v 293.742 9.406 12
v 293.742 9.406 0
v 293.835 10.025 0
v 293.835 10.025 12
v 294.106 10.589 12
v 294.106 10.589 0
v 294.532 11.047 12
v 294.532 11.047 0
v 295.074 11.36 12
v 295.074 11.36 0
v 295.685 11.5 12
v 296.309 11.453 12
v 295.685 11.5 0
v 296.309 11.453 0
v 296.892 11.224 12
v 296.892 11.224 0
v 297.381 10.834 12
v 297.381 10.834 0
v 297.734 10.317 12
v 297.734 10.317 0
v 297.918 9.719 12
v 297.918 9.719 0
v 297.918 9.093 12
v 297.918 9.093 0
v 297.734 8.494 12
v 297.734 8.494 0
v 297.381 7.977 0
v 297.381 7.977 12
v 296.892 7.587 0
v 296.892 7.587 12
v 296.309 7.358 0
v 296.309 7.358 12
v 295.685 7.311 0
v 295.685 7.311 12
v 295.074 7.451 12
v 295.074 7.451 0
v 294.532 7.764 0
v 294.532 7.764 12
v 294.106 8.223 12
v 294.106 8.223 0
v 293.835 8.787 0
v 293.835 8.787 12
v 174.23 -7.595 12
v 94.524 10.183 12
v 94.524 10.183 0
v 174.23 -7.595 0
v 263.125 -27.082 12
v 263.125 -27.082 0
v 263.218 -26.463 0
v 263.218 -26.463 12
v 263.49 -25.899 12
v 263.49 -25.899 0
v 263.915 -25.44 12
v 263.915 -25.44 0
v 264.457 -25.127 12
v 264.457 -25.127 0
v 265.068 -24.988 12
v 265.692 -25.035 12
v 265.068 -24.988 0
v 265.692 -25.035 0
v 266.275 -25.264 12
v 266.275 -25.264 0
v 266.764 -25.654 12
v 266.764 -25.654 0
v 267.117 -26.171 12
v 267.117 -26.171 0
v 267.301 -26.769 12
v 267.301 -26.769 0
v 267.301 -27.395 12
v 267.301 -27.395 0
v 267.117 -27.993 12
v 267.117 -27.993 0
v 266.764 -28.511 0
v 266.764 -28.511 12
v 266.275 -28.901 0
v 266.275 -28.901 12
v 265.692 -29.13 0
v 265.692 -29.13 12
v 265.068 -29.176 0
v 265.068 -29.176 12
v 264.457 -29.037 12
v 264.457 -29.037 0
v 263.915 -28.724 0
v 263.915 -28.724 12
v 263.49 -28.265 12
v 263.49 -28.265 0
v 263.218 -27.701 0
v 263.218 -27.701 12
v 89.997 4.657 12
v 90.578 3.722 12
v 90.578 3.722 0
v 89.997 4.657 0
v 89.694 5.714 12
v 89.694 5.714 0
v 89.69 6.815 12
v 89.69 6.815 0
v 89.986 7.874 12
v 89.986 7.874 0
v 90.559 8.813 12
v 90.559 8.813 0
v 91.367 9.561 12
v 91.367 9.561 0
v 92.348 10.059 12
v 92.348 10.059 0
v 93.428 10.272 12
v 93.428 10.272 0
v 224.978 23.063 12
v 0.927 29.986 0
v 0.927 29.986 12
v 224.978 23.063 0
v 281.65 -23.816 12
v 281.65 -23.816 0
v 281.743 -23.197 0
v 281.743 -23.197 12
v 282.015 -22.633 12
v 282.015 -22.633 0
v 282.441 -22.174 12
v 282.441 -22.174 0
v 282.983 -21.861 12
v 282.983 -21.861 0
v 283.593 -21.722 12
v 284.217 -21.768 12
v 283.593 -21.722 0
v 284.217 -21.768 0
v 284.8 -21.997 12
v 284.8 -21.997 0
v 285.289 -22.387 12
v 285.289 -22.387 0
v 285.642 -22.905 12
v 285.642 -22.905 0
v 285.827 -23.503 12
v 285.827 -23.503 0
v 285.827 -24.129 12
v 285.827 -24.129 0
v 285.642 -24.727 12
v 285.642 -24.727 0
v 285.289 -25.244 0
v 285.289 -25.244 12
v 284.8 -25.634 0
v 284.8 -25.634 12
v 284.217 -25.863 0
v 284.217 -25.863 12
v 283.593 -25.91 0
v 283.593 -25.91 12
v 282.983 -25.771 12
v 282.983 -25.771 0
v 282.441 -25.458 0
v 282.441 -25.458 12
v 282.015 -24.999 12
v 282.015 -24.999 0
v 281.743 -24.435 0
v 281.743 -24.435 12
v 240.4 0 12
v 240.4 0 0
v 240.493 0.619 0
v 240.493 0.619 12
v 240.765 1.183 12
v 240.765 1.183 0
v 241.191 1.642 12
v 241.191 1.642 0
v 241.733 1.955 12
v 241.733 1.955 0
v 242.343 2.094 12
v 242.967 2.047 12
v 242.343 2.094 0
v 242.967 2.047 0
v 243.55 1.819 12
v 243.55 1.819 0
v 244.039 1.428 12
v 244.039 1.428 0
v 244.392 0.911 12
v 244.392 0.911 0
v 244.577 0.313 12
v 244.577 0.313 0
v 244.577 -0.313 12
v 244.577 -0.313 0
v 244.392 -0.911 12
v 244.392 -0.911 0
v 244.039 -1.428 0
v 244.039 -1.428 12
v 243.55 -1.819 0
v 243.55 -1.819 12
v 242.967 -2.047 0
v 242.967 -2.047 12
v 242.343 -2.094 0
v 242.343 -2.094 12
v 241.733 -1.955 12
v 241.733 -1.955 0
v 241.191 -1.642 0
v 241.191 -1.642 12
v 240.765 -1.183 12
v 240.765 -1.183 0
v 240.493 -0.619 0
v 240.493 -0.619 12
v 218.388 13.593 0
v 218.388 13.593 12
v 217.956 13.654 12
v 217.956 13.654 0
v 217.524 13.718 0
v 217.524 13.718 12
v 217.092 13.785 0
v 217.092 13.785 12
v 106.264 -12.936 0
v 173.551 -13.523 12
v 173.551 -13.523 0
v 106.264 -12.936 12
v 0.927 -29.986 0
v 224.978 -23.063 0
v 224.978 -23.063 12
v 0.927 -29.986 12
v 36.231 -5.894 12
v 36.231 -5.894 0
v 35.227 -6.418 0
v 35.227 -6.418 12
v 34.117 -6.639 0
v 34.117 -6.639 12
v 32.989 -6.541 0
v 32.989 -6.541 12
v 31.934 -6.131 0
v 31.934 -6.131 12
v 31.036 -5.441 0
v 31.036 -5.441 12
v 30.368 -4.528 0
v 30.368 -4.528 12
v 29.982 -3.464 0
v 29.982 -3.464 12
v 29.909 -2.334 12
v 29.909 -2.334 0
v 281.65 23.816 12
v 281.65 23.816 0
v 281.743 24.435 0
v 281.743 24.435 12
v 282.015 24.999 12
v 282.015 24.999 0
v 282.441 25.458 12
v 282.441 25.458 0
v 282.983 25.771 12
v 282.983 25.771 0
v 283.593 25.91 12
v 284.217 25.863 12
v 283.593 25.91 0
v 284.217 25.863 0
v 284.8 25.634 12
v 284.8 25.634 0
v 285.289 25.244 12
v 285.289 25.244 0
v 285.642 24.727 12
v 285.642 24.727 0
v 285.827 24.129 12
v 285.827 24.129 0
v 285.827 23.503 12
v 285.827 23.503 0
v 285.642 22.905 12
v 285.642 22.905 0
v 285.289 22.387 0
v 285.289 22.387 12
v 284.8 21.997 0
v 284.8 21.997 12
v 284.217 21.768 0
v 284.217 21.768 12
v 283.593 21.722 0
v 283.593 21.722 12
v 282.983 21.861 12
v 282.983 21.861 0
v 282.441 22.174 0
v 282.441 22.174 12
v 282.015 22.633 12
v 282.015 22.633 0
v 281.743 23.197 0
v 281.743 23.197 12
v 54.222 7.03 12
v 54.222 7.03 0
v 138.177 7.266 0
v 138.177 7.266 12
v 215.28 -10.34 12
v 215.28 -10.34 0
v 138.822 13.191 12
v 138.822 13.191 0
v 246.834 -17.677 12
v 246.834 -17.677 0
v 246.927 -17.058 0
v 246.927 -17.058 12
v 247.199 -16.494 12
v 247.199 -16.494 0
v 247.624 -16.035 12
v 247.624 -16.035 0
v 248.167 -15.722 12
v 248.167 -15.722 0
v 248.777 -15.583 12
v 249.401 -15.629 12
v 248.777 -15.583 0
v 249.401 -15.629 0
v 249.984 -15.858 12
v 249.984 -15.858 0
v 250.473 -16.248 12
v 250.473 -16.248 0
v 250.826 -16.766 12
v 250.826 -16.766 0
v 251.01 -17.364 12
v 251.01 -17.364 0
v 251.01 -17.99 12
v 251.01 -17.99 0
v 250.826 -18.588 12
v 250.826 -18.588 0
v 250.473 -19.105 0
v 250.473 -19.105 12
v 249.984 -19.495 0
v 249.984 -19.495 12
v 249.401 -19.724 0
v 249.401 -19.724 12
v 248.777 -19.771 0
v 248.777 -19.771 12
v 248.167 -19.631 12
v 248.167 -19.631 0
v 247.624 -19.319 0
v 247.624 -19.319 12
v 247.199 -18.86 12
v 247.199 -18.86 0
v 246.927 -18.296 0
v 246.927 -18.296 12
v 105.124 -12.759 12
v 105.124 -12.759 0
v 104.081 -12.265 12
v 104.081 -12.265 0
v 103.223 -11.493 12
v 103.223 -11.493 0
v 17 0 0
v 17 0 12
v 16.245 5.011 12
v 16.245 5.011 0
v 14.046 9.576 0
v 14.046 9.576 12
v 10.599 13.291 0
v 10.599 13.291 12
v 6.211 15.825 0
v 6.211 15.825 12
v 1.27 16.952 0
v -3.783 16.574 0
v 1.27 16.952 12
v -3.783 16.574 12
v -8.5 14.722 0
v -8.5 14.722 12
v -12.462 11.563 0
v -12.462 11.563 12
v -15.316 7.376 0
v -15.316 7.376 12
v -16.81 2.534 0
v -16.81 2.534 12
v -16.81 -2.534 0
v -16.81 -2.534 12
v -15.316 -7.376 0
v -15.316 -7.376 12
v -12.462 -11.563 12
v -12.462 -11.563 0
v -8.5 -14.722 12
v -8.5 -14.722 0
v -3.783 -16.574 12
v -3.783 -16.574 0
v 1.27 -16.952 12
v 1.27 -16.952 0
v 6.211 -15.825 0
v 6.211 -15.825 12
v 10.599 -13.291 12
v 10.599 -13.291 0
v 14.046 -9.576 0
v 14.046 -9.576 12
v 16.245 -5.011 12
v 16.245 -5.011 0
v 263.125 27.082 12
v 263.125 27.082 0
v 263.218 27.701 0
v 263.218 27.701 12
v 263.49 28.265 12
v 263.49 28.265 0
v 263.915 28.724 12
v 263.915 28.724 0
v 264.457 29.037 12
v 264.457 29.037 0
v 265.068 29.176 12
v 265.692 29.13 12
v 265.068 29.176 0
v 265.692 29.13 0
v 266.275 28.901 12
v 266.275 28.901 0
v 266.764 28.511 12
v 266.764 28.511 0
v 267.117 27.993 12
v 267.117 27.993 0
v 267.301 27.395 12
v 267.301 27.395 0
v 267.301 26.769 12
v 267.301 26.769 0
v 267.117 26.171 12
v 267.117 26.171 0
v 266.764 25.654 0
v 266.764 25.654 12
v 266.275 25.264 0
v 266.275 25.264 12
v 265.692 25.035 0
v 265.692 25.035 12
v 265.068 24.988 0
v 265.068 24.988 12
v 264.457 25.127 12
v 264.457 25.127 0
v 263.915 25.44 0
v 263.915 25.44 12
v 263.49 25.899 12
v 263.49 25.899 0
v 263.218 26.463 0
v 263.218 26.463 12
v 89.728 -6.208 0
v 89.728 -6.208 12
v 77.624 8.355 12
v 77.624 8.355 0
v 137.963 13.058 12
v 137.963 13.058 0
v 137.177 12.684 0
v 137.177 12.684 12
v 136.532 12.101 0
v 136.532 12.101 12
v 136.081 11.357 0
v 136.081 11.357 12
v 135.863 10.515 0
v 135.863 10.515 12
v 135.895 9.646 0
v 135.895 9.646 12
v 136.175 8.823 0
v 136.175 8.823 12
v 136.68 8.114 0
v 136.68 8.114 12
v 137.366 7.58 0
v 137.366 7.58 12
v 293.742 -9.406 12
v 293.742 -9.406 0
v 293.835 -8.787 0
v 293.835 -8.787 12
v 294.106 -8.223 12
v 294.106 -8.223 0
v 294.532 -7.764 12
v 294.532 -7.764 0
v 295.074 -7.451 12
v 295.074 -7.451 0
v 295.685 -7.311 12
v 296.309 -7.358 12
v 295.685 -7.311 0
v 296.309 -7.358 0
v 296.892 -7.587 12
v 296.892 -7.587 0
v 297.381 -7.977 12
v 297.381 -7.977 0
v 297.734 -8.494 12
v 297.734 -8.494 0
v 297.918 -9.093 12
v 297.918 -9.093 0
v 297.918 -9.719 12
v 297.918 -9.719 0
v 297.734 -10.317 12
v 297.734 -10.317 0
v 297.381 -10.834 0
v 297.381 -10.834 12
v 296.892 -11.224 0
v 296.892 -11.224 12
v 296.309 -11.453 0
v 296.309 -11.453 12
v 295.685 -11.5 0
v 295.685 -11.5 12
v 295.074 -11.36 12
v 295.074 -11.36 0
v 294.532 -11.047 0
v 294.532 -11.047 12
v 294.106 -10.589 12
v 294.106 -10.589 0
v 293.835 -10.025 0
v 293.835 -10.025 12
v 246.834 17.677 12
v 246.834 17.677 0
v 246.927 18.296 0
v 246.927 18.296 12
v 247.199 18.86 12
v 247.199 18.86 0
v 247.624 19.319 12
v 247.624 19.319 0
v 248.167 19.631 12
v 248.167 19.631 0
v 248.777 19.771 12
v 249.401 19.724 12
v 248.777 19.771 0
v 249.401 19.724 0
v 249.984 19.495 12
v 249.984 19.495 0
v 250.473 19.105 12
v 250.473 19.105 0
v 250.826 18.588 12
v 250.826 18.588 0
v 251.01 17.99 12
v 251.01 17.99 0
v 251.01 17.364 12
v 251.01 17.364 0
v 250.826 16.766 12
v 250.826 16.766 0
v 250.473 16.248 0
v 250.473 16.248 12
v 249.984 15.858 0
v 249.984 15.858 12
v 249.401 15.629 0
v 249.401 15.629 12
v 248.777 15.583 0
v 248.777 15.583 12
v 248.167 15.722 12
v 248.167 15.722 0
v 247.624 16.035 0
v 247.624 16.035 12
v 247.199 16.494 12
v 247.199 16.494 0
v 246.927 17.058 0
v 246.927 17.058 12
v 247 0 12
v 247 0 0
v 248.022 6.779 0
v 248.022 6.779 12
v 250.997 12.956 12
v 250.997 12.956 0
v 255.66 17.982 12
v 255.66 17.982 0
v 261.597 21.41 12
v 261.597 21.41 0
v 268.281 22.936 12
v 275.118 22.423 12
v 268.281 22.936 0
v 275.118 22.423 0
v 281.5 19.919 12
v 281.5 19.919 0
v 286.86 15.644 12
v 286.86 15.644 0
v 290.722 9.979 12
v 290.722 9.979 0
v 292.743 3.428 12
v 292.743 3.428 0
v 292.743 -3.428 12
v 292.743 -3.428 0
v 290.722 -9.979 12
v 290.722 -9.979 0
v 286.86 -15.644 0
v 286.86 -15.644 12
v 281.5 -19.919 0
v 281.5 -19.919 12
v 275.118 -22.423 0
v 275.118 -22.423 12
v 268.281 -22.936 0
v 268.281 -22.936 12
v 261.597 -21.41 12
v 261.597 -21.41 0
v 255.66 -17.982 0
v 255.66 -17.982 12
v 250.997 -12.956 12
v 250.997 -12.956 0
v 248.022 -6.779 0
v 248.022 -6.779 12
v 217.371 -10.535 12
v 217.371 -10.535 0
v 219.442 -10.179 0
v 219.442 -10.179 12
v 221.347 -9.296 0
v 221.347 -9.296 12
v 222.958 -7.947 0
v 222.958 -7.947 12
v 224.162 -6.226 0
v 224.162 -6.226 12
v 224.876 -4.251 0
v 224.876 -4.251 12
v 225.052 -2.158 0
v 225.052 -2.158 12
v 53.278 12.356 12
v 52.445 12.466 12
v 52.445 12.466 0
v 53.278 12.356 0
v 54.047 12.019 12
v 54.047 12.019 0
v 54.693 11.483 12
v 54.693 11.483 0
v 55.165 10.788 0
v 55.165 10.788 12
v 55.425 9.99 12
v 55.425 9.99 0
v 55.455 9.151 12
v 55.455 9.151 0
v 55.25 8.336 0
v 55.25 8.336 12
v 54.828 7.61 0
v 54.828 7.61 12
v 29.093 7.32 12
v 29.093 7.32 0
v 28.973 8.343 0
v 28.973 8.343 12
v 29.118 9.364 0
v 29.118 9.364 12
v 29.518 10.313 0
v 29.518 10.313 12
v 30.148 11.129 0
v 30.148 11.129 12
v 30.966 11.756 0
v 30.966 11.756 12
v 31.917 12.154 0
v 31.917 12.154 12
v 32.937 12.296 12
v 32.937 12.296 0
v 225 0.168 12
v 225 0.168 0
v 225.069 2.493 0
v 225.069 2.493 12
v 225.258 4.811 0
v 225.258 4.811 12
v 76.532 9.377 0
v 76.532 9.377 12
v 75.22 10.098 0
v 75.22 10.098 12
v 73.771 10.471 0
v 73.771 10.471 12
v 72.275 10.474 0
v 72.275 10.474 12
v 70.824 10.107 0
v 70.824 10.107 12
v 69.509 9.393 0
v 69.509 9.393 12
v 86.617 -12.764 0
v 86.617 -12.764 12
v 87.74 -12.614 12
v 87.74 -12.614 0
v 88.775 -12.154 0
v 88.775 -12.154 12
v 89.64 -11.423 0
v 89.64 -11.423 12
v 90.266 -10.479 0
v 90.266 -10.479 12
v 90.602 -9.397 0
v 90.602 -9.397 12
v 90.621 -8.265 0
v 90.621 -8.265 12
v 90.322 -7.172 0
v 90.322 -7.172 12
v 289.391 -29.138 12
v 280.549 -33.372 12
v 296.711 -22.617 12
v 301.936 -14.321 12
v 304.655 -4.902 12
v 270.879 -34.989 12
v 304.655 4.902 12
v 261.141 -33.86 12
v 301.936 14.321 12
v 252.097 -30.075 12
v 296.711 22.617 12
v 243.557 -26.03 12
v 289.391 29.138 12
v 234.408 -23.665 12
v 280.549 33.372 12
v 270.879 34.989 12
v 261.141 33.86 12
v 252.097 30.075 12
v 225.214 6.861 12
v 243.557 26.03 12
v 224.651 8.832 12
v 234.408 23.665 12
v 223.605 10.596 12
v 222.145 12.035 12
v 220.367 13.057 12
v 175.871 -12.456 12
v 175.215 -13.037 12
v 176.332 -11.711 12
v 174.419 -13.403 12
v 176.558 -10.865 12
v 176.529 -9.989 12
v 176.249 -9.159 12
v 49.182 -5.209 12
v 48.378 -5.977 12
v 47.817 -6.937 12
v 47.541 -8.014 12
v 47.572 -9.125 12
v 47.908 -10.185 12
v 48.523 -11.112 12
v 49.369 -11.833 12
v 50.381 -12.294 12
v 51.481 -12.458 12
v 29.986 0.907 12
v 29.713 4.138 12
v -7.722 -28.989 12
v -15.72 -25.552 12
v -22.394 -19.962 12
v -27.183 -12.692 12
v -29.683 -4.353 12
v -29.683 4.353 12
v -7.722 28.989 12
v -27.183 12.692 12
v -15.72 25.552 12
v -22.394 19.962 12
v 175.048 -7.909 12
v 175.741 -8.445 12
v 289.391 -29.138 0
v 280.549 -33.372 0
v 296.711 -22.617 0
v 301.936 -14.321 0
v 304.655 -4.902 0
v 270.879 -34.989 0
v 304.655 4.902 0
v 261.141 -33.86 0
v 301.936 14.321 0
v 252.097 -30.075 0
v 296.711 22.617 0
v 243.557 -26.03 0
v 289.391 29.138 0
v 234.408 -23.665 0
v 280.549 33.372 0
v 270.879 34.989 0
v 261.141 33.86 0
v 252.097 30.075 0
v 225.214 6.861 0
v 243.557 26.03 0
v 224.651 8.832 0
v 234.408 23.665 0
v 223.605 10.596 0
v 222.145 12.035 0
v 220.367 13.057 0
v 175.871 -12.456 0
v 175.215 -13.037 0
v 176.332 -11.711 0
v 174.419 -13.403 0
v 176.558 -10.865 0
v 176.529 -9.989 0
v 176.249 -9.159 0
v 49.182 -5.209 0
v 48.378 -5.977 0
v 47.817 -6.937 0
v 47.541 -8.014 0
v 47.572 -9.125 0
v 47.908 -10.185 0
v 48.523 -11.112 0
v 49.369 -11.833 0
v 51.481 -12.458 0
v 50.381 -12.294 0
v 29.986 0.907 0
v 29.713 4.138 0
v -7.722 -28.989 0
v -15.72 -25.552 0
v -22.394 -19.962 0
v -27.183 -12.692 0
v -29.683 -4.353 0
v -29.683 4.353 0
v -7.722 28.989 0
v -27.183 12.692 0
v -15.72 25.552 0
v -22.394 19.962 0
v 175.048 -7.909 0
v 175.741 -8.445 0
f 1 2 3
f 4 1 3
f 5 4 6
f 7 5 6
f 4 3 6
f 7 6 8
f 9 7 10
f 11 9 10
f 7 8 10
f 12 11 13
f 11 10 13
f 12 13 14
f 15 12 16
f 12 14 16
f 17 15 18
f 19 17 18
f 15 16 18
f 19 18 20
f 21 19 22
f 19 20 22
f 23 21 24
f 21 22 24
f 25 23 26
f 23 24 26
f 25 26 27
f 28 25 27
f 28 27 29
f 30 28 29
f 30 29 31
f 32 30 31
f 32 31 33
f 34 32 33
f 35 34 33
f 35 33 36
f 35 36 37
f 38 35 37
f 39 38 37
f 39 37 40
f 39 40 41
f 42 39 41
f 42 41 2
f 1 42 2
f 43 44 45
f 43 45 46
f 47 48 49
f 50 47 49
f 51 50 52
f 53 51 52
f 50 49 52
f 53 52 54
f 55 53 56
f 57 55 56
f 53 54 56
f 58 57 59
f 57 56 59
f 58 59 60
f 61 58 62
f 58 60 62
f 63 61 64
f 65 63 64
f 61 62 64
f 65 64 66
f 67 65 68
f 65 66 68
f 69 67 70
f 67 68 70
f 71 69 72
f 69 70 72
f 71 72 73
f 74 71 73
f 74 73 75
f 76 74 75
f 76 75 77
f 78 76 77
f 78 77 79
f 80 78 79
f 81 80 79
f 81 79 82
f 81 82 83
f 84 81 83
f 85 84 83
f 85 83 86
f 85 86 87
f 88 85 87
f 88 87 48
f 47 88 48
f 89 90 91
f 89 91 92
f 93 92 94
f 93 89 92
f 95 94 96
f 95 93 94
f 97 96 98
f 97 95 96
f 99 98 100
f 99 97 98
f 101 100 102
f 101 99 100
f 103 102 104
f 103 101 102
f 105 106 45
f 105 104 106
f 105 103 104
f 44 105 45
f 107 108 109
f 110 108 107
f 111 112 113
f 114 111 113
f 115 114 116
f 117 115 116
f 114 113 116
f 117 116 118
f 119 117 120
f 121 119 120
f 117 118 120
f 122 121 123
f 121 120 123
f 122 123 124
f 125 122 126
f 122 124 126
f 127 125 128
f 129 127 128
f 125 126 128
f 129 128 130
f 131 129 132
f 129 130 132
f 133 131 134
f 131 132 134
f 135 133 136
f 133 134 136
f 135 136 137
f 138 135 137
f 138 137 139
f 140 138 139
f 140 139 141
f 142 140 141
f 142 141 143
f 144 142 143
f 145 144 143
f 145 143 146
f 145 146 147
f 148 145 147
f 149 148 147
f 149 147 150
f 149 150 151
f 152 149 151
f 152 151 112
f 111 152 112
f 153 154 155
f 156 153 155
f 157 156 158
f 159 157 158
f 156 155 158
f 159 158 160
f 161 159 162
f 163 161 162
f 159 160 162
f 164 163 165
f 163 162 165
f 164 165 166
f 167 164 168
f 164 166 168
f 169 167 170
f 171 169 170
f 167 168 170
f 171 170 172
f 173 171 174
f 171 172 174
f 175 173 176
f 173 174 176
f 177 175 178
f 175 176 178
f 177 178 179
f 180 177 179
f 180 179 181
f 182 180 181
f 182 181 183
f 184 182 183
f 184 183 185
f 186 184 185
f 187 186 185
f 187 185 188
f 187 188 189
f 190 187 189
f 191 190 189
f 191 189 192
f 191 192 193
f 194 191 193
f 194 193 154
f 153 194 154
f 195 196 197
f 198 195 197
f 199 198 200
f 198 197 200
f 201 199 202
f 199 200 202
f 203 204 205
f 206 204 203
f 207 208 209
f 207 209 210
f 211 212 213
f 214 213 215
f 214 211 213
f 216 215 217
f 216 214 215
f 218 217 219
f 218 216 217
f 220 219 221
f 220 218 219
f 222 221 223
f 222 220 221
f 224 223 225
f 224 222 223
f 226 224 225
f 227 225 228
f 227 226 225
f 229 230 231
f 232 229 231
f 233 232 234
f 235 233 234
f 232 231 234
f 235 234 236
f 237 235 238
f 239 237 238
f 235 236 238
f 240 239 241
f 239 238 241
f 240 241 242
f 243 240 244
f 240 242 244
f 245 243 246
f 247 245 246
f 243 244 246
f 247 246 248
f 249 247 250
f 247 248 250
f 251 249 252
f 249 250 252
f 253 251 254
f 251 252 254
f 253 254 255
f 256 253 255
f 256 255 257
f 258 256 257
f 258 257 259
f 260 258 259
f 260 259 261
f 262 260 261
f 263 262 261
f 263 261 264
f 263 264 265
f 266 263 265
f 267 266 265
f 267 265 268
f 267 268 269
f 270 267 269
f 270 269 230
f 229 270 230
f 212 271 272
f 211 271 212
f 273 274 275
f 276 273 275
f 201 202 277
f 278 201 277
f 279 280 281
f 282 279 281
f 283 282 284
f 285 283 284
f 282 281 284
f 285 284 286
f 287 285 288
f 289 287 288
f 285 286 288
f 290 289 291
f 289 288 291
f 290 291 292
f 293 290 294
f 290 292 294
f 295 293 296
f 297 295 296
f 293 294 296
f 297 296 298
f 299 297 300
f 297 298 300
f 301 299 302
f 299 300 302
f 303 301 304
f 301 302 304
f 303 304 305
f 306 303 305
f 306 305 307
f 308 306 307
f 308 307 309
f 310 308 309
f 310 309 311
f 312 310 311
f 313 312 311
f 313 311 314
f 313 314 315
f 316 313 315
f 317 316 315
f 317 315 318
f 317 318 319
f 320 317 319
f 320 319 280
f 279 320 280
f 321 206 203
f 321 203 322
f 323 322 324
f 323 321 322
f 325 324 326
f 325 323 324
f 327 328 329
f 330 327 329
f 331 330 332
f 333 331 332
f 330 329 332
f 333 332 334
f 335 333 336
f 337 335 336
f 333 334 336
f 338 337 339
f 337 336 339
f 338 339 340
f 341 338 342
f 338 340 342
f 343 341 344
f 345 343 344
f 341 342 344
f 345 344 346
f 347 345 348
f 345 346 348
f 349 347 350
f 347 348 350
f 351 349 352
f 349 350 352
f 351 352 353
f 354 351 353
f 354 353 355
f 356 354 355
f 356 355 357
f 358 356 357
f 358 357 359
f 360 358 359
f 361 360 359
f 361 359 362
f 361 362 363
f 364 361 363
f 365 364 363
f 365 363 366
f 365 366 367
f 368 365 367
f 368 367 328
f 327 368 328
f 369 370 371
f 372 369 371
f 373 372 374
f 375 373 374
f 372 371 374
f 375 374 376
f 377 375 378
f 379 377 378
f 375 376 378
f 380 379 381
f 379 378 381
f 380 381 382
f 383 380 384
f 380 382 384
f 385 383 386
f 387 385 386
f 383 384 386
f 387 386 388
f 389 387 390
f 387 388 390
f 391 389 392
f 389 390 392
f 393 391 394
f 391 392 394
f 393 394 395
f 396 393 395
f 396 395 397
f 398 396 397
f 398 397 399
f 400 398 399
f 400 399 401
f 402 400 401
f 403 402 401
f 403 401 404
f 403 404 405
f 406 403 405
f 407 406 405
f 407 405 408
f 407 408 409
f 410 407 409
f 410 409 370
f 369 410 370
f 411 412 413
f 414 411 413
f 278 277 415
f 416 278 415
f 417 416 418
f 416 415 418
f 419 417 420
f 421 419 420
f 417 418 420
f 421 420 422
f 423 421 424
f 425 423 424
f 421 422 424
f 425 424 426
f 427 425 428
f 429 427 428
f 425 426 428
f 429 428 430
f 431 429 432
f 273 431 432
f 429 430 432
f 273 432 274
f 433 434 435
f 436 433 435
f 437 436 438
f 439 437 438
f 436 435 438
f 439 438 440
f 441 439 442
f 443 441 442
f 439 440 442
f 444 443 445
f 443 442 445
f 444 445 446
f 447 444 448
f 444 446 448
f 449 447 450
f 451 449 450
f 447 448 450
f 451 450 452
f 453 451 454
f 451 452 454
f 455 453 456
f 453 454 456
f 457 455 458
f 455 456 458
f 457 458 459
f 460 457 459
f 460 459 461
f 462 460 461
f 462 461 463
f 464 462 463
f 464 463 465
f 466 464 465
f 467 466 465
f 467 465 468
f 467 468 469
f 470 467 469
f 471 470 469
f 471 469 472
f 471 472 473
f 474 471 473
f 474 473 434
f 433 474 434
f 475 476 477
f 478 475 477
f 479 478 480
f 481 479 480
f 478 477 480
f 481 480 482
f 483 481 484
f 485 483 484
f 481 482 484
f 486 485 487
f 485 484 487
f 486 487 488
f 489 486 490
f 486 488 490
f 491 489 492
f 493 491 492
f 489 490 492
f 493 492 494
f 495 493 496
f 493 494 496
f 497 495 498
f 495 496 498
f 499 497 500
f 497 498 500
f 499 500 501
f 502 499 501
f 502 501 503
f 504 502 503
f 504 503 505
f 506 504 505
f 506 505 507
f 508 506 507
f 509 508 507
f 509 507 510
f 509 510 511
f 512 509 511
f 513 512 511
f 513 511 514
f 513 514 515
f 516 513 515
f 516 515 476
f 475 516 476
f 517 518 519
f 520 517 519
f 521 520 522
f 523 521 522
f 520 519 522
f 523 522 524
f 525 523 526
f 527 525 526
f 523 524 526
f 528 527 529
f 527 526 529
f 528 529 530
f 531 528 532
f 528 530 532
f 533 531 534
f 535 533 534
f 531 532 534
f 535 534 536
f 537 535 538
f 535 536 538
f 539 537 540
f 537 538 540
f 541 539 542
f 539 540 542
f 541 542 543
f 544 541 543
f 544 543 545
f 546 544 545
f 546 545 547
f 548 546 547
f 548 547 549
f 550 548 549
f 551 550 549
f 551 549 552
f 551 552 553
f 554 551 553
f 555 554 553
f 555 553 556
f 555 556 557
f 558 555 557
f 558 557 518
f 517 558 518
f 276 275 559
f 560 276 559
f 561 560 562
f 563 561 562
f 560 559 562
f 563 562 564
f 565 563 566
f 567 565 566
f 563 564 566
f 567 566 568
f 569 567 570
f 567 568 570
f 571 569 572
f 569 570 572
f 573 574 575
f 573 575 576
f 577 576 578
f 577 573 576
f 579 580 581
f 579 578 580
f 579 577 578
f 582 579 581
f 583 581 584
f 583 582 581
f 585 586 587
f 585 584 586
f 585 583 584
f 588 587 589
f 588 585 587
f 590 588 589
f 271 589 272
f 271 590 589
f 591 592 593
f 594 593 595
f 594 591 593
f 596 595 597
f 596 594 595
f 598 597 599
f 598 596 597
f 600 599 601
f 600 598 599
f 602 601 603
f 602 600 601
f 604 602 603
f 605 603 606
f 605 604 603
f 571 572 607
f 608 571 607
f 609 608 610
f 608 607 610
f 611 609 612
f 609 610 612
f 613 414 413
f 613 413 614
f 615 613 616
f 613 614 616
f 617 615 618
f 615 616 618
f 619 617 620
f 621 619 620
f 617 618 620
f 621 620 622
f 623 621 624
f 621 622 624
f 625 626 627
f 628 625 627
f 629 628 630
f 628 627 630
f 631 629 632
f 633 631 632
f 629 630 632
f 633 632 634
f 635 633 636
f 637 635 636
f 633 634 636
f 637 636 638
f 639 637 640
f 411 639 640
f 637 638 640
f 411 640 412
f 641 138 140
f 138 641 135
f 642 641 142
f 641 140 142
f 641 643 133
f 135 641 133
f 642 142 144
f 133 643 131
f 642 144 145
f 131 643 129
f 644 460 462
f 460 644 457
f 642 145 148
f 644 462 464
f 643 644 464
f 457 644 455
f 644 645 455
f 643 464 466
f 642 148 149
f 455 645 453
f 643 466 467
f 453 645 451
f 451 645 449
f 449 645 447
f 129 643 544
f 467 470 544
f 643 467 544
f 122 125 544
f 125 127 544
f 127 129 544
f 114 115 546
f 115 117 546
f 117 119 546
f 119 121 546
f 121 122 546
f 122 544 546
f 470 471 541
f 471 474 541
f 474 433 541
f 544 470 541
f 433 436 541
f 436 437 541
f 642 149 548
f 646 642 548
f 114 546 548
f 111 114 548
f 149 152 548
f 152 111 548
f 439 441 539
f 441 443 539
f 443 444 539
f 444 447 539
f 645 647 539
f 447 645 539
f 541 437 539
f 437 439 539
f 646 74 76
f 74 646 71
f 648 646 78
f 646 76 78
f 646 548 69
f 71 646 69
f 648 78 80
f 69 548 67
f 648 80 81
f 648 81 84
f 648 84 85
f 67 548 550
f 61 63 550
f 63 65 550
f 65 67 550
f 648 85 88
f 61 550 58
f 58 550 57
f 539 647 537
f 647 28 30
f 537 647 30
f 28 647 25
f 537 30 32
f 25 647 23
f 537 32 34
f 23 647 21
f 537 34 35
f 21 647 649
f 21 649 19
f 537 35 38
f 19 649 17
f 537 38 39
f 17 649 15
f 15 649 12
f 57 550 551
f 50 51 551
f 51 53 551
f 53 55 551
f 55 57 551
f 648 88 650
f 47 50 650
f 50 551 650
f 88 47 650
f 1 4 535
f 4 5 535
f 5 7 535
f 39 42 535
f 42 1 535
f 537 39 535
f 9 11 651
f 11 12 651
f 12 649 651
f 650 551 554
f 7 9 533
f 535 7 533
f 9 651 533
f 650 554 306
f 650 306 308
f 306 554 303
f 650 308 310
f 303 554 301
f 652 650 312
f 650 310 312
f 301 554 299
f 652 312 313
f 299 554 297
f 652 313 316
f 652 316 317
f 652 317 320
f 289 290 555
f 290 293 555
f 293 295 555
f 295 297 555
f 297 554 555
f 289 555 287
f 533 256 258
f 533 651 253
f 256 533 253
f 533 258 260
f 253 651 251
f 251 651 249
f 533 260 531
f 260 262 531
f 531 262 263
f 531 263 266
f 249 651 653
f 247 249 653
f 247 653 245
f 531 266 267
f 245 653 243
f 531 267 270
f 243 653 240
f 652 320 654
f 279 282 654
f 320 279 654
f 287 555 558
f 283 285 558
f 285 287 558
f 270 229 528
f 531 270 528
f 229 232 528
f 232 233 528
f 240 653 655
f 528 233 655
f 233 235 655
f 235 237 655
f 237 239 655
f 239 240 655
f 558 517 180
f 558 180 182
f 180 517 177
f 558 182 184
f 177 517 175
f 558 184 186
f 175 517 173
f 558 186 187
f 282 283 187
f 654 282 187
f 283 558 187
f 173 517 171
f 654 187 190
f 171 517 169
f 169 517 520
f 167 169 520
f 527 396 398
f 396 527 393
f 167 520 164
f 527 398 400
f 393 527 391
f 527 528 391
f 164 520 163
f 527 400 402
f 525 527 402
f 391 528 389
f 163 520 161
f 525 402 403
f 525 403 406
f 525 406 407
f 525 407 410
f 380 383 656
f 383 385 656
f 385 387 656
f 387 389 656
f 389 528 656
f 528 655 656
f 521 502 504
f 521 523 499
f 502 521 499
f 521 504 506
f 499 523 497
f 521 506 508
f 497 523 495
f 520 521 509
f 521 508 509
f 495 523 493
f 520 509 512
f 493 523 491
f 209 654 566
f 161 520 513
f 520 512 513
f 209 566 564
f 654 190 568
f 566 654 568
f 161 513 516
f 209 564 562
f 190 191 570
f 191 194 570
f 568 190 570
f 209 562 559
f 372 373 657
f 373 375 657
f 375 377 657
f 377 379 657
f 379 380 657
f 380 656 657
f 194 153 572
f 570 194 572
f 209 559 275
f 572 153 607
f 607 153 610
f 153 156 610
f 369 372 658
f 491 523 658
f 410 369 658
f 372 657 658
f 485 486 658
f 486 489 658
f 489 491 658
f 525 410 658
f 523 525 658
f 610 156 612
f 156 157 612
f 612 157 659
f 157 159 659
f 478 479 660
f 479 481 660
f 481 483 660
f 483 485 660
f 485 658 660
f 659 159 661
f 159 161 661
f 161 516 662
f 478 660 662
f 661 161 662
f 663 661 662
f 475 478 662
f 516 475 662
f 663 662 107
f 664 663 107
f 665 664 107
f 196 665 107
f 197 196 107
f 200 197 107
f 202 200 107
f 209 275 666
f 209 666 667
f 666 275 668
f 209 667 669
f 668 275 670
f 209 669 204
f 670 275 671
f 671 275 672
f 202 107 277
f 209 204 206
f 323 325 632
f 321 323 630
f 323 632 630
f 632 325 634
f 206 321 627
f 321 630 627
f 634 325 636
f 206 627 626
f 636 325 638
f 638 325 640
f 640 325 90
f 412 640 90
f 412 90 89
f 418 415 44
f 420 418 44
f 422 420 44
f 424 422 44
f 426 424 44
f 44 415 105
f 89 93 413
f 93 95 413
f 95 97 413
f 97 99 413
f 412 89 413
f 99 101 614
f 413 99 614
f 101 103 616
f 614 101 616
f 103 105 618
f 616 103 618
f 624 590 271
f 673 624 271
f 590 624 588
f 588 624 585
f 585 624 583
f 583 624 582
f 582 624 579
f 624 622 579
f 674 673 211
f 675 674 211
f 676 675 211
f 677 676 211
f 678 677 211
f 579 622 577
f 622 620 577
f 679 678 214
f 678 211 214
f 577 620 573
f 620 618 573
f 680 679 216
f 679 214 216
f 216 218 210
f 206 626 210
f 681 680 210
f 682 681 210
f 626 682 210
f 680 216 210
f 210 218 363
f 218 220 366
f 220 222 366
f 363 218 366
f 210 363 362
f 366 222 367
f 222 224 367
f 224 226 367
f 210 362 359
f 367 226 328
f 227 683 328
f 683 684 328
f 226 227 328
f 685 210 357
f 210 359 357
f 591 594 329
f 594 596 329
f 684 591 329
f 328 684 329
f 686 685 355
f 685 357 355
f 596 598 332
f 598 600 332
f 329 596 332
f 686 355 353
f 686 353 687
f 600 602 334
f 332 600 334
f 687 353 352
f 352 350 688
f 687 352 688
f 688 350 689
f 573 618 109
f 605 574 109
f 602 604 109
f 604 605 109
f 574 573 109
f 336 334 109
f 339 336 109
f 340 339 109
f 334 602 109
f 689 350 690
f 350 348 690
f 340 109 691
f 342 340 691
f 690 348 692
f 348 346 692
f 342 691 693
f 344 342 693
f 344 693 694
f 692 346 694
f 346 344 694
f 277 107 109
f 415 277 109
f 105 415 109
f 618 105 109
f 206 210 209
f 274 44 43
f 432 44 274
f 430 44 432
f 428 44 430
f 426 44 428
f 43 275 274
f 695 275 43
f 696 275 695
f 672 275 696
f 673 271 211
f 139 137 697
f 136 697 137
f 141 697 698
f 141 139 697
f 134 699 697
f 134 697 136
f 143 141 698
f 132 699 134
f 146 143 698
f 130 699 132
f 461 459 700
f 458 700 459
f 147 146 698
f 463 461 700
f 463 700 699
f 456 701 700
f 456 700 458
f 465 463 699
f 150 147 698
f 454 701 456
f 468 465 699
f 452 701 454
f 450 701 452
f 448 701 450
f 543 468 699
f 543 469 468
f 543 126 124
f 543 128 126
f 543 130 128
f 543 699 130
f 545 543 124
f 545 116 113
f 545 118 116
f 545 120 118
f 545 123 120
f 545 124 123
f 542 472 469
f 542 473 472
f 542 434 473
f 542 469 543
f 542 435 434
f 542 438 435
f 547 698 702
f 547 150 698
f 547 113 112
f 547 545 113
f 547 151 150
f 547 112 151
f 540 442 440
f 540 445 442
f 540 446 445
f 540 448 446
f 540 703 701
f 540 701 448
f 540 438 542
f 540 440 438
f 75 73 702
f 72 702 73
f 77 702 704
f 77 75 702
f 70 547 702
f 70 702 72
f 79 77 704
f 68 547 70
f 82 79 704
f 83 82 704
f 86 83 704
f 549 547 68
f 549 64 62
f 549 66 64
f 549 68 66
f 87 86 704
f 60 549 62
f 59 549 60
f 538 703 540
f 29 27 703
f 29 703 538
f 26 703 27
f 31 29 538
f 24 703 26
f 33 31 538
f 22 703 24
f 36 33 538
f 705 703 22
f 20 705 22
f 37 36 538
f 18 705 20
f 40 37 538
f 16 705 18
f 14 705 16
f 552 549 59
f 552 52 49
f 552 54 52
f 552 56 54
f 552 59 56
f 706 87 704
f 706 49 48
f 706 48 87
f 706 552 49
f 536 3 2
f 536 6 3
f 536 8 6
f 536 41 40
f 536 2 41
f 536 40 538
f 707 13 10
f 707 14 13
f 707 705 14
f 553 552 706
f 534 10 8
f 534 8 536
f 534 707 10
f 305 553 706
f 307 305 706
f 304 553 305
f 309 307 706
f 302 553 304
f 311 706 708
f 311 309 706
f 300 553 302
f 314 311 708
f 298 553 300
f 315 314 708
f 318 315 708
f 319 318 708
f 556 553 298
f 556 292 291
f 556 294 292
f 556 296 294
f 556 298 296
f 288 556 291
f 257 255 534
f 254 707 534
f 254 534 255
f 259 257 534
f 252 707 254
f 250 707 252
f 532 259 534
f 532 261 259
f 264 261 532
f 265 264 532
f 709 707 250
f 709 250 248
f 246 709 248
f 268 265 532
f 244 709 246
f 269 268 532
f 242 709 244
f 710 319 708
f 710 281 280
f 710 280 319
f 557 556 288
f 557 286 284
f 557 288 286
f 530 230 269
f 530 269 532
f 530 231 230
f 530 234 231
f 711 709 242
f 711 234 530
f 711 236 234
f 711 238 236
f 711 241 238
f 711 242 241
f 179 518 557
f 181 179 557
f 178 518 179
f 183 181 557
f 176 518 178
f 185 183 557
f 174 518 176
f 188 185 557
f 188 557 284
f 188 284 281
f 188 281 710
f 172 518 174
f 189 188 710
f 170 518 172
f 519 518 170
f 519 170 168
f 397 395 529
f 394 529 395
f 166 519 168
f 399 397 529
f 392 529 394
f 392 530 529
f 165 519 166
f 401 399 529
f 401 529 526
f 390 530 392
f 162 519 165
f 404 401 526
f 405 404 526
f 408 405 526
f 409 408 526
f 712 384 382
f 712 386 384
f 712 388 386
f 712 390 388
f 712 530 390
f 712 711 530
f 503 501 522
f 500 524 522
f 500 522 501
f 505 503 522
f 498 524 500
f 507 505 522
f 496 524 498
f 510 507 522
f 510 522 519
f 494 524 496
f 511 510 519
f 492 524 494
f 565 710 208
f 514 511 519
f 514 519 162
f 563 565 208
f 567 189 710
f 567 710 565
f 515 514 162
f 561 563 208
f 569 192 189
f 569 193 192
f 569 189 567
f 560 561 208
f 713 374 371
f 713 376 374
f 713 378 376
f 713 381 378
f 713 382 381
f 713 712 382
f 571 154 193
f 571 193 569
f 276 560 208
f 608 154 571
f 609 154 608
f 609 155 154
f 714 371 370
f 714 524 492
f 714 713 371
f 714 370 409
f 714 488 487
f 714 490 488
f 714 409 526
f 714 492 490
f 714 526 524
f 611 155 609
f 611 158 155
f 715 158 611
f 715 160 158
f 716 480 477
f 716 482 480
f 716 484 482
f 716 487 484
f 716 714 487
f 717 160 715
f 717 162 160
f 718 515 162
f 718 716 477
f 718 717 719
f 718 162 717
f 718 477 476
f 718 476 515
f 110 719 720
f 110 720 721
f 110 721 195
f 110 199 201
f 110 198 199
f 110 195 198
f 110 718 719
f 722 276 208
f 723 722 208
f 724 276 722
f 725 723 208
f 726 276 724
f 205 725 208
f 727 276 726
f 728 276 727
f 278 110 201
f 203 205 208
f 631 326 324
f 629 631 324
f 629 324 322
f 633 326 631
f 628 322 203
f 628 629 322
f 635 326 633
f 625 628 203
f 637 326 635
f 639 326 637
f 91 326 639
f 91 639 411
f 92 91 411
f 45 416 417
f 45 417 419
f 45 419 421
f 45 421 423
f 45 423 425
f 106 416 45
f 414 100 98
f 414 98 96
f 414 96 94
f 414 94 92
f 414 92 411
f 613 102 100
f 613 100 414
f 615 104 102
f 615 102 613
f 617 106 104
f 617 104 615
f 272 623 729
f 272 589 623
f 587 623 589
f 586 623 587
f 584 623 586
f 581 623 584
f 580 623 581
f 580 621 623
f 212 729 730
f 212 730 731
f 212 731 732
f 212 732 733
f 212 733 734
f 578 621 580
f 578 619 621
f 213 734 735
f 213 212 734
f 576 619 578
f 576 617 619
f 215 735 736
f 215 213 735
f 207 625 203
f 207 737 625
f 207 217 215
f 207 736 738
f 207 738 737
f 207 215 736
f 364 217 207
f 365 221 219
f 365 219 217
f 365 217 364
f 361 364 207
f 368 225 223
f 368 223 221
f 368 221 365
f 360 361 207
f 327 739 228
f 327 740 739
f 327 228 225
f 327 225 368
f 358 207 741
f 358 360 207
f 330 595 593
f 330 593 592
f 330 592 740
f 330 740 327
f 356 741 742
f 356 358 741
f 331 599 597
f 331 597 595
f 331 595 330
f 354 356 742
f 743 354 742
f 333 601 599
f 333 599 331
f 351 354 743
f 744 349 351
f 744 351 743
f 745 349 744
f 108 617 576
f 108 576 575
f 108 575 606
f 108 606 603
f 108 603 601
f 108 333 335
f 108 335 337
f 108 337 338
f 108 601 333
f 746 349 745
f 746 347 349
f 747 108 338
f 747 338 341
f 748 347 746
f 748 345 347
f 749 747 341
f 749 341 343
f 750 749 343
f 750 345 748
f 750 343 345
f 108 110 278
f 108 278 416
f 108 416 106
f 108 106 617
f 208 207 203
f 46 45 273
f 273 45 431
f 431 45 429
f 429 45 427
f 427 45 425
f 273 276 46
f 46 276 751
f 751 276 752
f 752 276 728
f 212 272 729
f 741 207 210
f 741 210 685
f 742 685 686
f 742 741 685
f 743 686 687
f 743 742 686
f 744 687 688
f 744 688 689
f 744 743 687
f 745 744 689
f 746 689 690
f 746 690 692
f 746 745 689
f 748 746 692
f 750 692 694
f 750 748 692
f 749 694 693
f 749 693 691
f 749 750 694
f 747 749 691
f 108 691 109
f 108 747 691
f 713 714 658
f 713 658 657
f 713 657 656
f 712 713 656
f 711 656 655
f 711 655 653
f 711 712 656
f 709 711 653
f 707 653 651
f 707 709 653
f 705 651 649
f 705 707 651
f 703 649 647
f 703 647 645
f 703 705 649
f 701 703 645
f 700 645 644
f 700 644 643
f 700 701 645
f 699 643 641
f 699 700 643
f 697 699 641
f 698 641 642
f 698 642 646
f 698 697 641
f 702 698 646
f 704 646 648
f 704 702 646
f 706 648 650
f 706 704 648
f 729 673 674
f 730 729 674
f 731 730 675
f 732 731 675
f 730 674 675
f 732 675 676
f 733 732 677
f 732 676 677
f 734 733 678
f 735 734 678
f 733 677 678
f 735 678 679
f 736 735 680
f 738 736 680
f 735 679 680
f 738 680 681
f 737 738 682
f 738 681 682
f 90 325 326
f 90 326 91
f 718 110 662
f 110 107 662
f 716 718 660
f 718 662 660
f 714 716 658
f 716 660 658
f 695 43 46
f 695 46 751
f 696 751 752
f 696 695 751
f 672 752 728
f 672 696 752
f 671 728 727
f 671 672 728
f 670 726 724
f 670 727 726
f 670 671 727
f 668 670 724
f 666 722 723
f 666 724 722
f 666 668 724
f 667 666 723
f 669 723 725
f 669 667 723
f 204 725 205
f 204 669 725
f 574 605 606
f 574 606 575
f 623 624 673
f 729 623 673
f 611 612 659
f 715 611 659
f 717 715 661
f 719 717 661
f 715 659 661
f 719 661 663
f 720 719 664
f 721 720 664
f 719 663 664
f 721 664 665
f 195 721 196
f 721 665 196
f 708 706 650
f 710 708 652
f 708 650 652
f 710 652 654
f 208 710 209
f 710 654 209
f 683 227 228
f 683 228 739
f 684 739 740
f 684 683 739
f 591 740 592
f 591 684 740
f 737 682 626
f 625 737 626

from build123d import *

# Parameters (mm, degrees)
EXTRUDE_1_DEPTH     = 12
SKETCH_2_R          = 17
CUT_EXTRUDE_1_DEPTH = 13
FILLET_1_R          = 50
SKETCH_6_R          = 2.1
CUT_EXTRUDE_5_DEPTH = 13
SKETCH_8_R          = 23
CUT_EXTRUDE_6_DEPTH = 13
CUT_EXTRUDE_7_DEPTH = 13
SKETCH_12_W         = 2.62725081
SKETCH_12_H         = 4.213047789
EXTRUDE_4_DEPTH     = 2
SKETCH_13_R         = 2.56677592
EXTRUDE_5_DEPTH     = 2


with BuildPart() as part:
    # 草图1 → 凸台-拉伸1 (new body)
    with BuildSketch(Plane.XY):
        with BuildLine():
            Line((0.926524708, 29.985689119), (243.190486763, 22.5))
            ThreePointArc((243.190486763, 22.5), (305, 0), (243.190486763, -22.5))
            Line((243.190486763, -22.5), (0.926524708, -29.985689119))
            ThreePointArc((0.926524708, -29.985689119), (-30, 0), (0.926524708, 29.985689119))
        make_face()
    extrude(amount=EXTRUDE_1_DEPTH)

    # 草图2 → 切除-拉伸1 (cut, through all)
    with BuildSketch(Plane.XY.offset(12)):
        Circle(SKETCH_2_R)
    extrude(amount=-CUT_EXTRUDE_1_DEPTH, mode=Mode.SUBTRACT)

    # 圆角1
    fillet_1_edges = [part.edges().sort_by_distance(p)[0] for p in [
        (243.190486763, 22.5, 6),
        (243.190486763, -22.5, 6),
    ]]
    fillet(fillet_1_edges, radius=FILLET_1_R)

    # 草图6 → 切除-拉伸5 (cut, through all)
    with BuildSketch(Plane(origin=(0, 0, 0), x_dir=(-1, 0, 0), z_dir=(0, 0, -1))):
        with Locations((-242.5, 0)):
            Circle(SKETCH_6_R)
        with Locations((-248.933777814, -17.676659266)):
            Circle(SKETCH_6_R)
        with Locations((-265.224675114, -27.082213208)):
            Circle(SKETCH_6_R)
        with Locations((-283.75, -23.815698604)):
            Circle(SKETCH_6_R)
        with Locations((-295.841547072, -9.405553941)):
            Circle(SKETCH_6_R)
        with Locations((-295.841547072, 9.405553941)):
            Circle(SKETCH_6_R)
        with Locations((-283.75, 23.815698604)):
            Circle(SKETCH_6_R)
        with Locations((-265.224675114, 27.082213208)):
            Circle(SKETCH_6_R)
        with Locations((-248.933777814, 17.676659266)):
            Circle(SKETCH_6_R)
    extrude(amount=-CUT_EXTRUDE_5_DEPTH, mode=Mode.SUBTRACT)

    # 草图8 → 切除-拉伸6 (cut, through all)
    with BuildSketch(Plane(origin=(0, 0, 0), x_dir=(-1, 0, 0), z_dir=(0, 0, -1))):
        with Locations((-270, 0)):
            Circle(SKETCH_8_R)
    extrude(amount=-CUT_EXTRUDE_6_DEPTH, mode=Mode.SUBTRACT)

    # 草图9 → 切除-拉伸7 (cut, through all)
    with BuildSketch(Plane.XY.offset(12)):
        with BuildLine():
            Line((138.177203146, 7.265958797), (215.280000441, -10.340469156))
            ThreePointArc((215.280000441, -10.340469156), (222.197122435, -8.67472562), (225.051756781, -2.157644912))
            ThreePointArc((225.051756781, -2.157644912), (225.019683108, 1.330823929), (225.25794544, 4.811294392))
            ThreePointArc((225.25794544, 4.811294392), (223.604832456, 10.595836396), (218.388318749, 13.592783755))
            ThreePointArc((218.388318749, 13.592783755), (217.739691011, 13.685144373), (217.09211046, 13.784582076))
            Line((217.09211046, 13.784582076), (138.82229573, 13.190588508))
            ThreePointArc((138.82229573, 13.190588508), (135.862688972, 10.515405209), (138.177203146, 7.265958797))
        make_face()
        with BuildLine():
            Line((32.937456826, 12.295827459), (52.445209699, 12.46606904))
            ThreePointArc((52.445209699, 12.46606904), (55.323007544, 10.397995174), (54.221641474, 7.029665807))
            Line((54.221641474, 7.029665807), (36.230602759, -5.894048054))
            ThreePointArc((36.230602759, -5.894048054), (31.93419641, -6.130708054), (29.909058708, -2.334139502))
            ThreePointArc((29.909058708, -2.334139502), (29.893460188, 2.526071657), (29.093261442, 7.319982148))
            ThreePointArc((29.093261442, 7.319982148), (29.806984137, 10.741460671), (32.937456826, 12.295827459))
        make_face()
        with BuildLine():
            Line((51.481125102, -12.457655601), (86.617092144, -12.76428254))
            ThreePointArc((86.617092144, -12.76428254), (90.265824875, -10.479152721), (89.728149821, -6.207622039))
            Line((89.728149821, -6.207622039), (77.62420084, 8.354875892))
            ThreePointArc((77.62420084, 8.354875892), (73.771130602, 10.471180848), (69.509469202, 9.392691606))
            Line((69.509469202, 9.392691606), (49.182361686, -5.209117958))
            ThreePointArc((49.182361686, -5.209117958), (47.703176381, -9.666996809), (51.481125102, -12.457655601))
        make_face()
        with BuildLine():
            Line((103.223250725, -11.492707953), (90.577517941, 3.721620677))
            ThreePointArc((90.577517941, 3.721620677), (90.240211818, 8.363692898), (94.524430804, 10.18250504))
            Line((94.524430804, 10.18250504), (174.23015633, -7.595003002))
            ThreePointArc((174.23015633, -7.595003002), (176.557582723, -10.864575787), (173.550905727, -13.522942438))
            Line((173.550905727, -13.522942438), (106.264496118, -12.935742837))
            ThreePointArc((106.264496118, -12.935742837), (104.584684386, -12.549721733), (103.223250725, -11.492707953))
        make_face()
    extrude(amount=-CUT_EXTRUDE_7_DEPTH, mode=Mode.SUBTRACT)


with BuildPart() as body_2:
    # 草图12 → 凸台-拉伸4 (new body)
    with BuildSketch(Plane(origin=(0, 0, 0), x_dir=(0, 0, -1), z_dir=(1, 0, 0))):
        with Locations((1.313625405, 2.106523894)):
            Rectangle(SKETCH_12_W, SKETCH_12_H)
    extrude(amount=EXTRUDE_4_DEPTH)


with BuildPart() as body_3:
    # 草图13 → 凸台-拉伸5 (new body)
    with BuildSketch(Plane(origin=(0, 0, 0), x_dir=(0, 0, -1), z_dir=(1, 0, 0))):
        with Locations((-9.79748635, 0)):
            Circle(SKETCH_13_R)
    extrude(amount=EXTRUDE_5_DEPTH)


solid = part.part
